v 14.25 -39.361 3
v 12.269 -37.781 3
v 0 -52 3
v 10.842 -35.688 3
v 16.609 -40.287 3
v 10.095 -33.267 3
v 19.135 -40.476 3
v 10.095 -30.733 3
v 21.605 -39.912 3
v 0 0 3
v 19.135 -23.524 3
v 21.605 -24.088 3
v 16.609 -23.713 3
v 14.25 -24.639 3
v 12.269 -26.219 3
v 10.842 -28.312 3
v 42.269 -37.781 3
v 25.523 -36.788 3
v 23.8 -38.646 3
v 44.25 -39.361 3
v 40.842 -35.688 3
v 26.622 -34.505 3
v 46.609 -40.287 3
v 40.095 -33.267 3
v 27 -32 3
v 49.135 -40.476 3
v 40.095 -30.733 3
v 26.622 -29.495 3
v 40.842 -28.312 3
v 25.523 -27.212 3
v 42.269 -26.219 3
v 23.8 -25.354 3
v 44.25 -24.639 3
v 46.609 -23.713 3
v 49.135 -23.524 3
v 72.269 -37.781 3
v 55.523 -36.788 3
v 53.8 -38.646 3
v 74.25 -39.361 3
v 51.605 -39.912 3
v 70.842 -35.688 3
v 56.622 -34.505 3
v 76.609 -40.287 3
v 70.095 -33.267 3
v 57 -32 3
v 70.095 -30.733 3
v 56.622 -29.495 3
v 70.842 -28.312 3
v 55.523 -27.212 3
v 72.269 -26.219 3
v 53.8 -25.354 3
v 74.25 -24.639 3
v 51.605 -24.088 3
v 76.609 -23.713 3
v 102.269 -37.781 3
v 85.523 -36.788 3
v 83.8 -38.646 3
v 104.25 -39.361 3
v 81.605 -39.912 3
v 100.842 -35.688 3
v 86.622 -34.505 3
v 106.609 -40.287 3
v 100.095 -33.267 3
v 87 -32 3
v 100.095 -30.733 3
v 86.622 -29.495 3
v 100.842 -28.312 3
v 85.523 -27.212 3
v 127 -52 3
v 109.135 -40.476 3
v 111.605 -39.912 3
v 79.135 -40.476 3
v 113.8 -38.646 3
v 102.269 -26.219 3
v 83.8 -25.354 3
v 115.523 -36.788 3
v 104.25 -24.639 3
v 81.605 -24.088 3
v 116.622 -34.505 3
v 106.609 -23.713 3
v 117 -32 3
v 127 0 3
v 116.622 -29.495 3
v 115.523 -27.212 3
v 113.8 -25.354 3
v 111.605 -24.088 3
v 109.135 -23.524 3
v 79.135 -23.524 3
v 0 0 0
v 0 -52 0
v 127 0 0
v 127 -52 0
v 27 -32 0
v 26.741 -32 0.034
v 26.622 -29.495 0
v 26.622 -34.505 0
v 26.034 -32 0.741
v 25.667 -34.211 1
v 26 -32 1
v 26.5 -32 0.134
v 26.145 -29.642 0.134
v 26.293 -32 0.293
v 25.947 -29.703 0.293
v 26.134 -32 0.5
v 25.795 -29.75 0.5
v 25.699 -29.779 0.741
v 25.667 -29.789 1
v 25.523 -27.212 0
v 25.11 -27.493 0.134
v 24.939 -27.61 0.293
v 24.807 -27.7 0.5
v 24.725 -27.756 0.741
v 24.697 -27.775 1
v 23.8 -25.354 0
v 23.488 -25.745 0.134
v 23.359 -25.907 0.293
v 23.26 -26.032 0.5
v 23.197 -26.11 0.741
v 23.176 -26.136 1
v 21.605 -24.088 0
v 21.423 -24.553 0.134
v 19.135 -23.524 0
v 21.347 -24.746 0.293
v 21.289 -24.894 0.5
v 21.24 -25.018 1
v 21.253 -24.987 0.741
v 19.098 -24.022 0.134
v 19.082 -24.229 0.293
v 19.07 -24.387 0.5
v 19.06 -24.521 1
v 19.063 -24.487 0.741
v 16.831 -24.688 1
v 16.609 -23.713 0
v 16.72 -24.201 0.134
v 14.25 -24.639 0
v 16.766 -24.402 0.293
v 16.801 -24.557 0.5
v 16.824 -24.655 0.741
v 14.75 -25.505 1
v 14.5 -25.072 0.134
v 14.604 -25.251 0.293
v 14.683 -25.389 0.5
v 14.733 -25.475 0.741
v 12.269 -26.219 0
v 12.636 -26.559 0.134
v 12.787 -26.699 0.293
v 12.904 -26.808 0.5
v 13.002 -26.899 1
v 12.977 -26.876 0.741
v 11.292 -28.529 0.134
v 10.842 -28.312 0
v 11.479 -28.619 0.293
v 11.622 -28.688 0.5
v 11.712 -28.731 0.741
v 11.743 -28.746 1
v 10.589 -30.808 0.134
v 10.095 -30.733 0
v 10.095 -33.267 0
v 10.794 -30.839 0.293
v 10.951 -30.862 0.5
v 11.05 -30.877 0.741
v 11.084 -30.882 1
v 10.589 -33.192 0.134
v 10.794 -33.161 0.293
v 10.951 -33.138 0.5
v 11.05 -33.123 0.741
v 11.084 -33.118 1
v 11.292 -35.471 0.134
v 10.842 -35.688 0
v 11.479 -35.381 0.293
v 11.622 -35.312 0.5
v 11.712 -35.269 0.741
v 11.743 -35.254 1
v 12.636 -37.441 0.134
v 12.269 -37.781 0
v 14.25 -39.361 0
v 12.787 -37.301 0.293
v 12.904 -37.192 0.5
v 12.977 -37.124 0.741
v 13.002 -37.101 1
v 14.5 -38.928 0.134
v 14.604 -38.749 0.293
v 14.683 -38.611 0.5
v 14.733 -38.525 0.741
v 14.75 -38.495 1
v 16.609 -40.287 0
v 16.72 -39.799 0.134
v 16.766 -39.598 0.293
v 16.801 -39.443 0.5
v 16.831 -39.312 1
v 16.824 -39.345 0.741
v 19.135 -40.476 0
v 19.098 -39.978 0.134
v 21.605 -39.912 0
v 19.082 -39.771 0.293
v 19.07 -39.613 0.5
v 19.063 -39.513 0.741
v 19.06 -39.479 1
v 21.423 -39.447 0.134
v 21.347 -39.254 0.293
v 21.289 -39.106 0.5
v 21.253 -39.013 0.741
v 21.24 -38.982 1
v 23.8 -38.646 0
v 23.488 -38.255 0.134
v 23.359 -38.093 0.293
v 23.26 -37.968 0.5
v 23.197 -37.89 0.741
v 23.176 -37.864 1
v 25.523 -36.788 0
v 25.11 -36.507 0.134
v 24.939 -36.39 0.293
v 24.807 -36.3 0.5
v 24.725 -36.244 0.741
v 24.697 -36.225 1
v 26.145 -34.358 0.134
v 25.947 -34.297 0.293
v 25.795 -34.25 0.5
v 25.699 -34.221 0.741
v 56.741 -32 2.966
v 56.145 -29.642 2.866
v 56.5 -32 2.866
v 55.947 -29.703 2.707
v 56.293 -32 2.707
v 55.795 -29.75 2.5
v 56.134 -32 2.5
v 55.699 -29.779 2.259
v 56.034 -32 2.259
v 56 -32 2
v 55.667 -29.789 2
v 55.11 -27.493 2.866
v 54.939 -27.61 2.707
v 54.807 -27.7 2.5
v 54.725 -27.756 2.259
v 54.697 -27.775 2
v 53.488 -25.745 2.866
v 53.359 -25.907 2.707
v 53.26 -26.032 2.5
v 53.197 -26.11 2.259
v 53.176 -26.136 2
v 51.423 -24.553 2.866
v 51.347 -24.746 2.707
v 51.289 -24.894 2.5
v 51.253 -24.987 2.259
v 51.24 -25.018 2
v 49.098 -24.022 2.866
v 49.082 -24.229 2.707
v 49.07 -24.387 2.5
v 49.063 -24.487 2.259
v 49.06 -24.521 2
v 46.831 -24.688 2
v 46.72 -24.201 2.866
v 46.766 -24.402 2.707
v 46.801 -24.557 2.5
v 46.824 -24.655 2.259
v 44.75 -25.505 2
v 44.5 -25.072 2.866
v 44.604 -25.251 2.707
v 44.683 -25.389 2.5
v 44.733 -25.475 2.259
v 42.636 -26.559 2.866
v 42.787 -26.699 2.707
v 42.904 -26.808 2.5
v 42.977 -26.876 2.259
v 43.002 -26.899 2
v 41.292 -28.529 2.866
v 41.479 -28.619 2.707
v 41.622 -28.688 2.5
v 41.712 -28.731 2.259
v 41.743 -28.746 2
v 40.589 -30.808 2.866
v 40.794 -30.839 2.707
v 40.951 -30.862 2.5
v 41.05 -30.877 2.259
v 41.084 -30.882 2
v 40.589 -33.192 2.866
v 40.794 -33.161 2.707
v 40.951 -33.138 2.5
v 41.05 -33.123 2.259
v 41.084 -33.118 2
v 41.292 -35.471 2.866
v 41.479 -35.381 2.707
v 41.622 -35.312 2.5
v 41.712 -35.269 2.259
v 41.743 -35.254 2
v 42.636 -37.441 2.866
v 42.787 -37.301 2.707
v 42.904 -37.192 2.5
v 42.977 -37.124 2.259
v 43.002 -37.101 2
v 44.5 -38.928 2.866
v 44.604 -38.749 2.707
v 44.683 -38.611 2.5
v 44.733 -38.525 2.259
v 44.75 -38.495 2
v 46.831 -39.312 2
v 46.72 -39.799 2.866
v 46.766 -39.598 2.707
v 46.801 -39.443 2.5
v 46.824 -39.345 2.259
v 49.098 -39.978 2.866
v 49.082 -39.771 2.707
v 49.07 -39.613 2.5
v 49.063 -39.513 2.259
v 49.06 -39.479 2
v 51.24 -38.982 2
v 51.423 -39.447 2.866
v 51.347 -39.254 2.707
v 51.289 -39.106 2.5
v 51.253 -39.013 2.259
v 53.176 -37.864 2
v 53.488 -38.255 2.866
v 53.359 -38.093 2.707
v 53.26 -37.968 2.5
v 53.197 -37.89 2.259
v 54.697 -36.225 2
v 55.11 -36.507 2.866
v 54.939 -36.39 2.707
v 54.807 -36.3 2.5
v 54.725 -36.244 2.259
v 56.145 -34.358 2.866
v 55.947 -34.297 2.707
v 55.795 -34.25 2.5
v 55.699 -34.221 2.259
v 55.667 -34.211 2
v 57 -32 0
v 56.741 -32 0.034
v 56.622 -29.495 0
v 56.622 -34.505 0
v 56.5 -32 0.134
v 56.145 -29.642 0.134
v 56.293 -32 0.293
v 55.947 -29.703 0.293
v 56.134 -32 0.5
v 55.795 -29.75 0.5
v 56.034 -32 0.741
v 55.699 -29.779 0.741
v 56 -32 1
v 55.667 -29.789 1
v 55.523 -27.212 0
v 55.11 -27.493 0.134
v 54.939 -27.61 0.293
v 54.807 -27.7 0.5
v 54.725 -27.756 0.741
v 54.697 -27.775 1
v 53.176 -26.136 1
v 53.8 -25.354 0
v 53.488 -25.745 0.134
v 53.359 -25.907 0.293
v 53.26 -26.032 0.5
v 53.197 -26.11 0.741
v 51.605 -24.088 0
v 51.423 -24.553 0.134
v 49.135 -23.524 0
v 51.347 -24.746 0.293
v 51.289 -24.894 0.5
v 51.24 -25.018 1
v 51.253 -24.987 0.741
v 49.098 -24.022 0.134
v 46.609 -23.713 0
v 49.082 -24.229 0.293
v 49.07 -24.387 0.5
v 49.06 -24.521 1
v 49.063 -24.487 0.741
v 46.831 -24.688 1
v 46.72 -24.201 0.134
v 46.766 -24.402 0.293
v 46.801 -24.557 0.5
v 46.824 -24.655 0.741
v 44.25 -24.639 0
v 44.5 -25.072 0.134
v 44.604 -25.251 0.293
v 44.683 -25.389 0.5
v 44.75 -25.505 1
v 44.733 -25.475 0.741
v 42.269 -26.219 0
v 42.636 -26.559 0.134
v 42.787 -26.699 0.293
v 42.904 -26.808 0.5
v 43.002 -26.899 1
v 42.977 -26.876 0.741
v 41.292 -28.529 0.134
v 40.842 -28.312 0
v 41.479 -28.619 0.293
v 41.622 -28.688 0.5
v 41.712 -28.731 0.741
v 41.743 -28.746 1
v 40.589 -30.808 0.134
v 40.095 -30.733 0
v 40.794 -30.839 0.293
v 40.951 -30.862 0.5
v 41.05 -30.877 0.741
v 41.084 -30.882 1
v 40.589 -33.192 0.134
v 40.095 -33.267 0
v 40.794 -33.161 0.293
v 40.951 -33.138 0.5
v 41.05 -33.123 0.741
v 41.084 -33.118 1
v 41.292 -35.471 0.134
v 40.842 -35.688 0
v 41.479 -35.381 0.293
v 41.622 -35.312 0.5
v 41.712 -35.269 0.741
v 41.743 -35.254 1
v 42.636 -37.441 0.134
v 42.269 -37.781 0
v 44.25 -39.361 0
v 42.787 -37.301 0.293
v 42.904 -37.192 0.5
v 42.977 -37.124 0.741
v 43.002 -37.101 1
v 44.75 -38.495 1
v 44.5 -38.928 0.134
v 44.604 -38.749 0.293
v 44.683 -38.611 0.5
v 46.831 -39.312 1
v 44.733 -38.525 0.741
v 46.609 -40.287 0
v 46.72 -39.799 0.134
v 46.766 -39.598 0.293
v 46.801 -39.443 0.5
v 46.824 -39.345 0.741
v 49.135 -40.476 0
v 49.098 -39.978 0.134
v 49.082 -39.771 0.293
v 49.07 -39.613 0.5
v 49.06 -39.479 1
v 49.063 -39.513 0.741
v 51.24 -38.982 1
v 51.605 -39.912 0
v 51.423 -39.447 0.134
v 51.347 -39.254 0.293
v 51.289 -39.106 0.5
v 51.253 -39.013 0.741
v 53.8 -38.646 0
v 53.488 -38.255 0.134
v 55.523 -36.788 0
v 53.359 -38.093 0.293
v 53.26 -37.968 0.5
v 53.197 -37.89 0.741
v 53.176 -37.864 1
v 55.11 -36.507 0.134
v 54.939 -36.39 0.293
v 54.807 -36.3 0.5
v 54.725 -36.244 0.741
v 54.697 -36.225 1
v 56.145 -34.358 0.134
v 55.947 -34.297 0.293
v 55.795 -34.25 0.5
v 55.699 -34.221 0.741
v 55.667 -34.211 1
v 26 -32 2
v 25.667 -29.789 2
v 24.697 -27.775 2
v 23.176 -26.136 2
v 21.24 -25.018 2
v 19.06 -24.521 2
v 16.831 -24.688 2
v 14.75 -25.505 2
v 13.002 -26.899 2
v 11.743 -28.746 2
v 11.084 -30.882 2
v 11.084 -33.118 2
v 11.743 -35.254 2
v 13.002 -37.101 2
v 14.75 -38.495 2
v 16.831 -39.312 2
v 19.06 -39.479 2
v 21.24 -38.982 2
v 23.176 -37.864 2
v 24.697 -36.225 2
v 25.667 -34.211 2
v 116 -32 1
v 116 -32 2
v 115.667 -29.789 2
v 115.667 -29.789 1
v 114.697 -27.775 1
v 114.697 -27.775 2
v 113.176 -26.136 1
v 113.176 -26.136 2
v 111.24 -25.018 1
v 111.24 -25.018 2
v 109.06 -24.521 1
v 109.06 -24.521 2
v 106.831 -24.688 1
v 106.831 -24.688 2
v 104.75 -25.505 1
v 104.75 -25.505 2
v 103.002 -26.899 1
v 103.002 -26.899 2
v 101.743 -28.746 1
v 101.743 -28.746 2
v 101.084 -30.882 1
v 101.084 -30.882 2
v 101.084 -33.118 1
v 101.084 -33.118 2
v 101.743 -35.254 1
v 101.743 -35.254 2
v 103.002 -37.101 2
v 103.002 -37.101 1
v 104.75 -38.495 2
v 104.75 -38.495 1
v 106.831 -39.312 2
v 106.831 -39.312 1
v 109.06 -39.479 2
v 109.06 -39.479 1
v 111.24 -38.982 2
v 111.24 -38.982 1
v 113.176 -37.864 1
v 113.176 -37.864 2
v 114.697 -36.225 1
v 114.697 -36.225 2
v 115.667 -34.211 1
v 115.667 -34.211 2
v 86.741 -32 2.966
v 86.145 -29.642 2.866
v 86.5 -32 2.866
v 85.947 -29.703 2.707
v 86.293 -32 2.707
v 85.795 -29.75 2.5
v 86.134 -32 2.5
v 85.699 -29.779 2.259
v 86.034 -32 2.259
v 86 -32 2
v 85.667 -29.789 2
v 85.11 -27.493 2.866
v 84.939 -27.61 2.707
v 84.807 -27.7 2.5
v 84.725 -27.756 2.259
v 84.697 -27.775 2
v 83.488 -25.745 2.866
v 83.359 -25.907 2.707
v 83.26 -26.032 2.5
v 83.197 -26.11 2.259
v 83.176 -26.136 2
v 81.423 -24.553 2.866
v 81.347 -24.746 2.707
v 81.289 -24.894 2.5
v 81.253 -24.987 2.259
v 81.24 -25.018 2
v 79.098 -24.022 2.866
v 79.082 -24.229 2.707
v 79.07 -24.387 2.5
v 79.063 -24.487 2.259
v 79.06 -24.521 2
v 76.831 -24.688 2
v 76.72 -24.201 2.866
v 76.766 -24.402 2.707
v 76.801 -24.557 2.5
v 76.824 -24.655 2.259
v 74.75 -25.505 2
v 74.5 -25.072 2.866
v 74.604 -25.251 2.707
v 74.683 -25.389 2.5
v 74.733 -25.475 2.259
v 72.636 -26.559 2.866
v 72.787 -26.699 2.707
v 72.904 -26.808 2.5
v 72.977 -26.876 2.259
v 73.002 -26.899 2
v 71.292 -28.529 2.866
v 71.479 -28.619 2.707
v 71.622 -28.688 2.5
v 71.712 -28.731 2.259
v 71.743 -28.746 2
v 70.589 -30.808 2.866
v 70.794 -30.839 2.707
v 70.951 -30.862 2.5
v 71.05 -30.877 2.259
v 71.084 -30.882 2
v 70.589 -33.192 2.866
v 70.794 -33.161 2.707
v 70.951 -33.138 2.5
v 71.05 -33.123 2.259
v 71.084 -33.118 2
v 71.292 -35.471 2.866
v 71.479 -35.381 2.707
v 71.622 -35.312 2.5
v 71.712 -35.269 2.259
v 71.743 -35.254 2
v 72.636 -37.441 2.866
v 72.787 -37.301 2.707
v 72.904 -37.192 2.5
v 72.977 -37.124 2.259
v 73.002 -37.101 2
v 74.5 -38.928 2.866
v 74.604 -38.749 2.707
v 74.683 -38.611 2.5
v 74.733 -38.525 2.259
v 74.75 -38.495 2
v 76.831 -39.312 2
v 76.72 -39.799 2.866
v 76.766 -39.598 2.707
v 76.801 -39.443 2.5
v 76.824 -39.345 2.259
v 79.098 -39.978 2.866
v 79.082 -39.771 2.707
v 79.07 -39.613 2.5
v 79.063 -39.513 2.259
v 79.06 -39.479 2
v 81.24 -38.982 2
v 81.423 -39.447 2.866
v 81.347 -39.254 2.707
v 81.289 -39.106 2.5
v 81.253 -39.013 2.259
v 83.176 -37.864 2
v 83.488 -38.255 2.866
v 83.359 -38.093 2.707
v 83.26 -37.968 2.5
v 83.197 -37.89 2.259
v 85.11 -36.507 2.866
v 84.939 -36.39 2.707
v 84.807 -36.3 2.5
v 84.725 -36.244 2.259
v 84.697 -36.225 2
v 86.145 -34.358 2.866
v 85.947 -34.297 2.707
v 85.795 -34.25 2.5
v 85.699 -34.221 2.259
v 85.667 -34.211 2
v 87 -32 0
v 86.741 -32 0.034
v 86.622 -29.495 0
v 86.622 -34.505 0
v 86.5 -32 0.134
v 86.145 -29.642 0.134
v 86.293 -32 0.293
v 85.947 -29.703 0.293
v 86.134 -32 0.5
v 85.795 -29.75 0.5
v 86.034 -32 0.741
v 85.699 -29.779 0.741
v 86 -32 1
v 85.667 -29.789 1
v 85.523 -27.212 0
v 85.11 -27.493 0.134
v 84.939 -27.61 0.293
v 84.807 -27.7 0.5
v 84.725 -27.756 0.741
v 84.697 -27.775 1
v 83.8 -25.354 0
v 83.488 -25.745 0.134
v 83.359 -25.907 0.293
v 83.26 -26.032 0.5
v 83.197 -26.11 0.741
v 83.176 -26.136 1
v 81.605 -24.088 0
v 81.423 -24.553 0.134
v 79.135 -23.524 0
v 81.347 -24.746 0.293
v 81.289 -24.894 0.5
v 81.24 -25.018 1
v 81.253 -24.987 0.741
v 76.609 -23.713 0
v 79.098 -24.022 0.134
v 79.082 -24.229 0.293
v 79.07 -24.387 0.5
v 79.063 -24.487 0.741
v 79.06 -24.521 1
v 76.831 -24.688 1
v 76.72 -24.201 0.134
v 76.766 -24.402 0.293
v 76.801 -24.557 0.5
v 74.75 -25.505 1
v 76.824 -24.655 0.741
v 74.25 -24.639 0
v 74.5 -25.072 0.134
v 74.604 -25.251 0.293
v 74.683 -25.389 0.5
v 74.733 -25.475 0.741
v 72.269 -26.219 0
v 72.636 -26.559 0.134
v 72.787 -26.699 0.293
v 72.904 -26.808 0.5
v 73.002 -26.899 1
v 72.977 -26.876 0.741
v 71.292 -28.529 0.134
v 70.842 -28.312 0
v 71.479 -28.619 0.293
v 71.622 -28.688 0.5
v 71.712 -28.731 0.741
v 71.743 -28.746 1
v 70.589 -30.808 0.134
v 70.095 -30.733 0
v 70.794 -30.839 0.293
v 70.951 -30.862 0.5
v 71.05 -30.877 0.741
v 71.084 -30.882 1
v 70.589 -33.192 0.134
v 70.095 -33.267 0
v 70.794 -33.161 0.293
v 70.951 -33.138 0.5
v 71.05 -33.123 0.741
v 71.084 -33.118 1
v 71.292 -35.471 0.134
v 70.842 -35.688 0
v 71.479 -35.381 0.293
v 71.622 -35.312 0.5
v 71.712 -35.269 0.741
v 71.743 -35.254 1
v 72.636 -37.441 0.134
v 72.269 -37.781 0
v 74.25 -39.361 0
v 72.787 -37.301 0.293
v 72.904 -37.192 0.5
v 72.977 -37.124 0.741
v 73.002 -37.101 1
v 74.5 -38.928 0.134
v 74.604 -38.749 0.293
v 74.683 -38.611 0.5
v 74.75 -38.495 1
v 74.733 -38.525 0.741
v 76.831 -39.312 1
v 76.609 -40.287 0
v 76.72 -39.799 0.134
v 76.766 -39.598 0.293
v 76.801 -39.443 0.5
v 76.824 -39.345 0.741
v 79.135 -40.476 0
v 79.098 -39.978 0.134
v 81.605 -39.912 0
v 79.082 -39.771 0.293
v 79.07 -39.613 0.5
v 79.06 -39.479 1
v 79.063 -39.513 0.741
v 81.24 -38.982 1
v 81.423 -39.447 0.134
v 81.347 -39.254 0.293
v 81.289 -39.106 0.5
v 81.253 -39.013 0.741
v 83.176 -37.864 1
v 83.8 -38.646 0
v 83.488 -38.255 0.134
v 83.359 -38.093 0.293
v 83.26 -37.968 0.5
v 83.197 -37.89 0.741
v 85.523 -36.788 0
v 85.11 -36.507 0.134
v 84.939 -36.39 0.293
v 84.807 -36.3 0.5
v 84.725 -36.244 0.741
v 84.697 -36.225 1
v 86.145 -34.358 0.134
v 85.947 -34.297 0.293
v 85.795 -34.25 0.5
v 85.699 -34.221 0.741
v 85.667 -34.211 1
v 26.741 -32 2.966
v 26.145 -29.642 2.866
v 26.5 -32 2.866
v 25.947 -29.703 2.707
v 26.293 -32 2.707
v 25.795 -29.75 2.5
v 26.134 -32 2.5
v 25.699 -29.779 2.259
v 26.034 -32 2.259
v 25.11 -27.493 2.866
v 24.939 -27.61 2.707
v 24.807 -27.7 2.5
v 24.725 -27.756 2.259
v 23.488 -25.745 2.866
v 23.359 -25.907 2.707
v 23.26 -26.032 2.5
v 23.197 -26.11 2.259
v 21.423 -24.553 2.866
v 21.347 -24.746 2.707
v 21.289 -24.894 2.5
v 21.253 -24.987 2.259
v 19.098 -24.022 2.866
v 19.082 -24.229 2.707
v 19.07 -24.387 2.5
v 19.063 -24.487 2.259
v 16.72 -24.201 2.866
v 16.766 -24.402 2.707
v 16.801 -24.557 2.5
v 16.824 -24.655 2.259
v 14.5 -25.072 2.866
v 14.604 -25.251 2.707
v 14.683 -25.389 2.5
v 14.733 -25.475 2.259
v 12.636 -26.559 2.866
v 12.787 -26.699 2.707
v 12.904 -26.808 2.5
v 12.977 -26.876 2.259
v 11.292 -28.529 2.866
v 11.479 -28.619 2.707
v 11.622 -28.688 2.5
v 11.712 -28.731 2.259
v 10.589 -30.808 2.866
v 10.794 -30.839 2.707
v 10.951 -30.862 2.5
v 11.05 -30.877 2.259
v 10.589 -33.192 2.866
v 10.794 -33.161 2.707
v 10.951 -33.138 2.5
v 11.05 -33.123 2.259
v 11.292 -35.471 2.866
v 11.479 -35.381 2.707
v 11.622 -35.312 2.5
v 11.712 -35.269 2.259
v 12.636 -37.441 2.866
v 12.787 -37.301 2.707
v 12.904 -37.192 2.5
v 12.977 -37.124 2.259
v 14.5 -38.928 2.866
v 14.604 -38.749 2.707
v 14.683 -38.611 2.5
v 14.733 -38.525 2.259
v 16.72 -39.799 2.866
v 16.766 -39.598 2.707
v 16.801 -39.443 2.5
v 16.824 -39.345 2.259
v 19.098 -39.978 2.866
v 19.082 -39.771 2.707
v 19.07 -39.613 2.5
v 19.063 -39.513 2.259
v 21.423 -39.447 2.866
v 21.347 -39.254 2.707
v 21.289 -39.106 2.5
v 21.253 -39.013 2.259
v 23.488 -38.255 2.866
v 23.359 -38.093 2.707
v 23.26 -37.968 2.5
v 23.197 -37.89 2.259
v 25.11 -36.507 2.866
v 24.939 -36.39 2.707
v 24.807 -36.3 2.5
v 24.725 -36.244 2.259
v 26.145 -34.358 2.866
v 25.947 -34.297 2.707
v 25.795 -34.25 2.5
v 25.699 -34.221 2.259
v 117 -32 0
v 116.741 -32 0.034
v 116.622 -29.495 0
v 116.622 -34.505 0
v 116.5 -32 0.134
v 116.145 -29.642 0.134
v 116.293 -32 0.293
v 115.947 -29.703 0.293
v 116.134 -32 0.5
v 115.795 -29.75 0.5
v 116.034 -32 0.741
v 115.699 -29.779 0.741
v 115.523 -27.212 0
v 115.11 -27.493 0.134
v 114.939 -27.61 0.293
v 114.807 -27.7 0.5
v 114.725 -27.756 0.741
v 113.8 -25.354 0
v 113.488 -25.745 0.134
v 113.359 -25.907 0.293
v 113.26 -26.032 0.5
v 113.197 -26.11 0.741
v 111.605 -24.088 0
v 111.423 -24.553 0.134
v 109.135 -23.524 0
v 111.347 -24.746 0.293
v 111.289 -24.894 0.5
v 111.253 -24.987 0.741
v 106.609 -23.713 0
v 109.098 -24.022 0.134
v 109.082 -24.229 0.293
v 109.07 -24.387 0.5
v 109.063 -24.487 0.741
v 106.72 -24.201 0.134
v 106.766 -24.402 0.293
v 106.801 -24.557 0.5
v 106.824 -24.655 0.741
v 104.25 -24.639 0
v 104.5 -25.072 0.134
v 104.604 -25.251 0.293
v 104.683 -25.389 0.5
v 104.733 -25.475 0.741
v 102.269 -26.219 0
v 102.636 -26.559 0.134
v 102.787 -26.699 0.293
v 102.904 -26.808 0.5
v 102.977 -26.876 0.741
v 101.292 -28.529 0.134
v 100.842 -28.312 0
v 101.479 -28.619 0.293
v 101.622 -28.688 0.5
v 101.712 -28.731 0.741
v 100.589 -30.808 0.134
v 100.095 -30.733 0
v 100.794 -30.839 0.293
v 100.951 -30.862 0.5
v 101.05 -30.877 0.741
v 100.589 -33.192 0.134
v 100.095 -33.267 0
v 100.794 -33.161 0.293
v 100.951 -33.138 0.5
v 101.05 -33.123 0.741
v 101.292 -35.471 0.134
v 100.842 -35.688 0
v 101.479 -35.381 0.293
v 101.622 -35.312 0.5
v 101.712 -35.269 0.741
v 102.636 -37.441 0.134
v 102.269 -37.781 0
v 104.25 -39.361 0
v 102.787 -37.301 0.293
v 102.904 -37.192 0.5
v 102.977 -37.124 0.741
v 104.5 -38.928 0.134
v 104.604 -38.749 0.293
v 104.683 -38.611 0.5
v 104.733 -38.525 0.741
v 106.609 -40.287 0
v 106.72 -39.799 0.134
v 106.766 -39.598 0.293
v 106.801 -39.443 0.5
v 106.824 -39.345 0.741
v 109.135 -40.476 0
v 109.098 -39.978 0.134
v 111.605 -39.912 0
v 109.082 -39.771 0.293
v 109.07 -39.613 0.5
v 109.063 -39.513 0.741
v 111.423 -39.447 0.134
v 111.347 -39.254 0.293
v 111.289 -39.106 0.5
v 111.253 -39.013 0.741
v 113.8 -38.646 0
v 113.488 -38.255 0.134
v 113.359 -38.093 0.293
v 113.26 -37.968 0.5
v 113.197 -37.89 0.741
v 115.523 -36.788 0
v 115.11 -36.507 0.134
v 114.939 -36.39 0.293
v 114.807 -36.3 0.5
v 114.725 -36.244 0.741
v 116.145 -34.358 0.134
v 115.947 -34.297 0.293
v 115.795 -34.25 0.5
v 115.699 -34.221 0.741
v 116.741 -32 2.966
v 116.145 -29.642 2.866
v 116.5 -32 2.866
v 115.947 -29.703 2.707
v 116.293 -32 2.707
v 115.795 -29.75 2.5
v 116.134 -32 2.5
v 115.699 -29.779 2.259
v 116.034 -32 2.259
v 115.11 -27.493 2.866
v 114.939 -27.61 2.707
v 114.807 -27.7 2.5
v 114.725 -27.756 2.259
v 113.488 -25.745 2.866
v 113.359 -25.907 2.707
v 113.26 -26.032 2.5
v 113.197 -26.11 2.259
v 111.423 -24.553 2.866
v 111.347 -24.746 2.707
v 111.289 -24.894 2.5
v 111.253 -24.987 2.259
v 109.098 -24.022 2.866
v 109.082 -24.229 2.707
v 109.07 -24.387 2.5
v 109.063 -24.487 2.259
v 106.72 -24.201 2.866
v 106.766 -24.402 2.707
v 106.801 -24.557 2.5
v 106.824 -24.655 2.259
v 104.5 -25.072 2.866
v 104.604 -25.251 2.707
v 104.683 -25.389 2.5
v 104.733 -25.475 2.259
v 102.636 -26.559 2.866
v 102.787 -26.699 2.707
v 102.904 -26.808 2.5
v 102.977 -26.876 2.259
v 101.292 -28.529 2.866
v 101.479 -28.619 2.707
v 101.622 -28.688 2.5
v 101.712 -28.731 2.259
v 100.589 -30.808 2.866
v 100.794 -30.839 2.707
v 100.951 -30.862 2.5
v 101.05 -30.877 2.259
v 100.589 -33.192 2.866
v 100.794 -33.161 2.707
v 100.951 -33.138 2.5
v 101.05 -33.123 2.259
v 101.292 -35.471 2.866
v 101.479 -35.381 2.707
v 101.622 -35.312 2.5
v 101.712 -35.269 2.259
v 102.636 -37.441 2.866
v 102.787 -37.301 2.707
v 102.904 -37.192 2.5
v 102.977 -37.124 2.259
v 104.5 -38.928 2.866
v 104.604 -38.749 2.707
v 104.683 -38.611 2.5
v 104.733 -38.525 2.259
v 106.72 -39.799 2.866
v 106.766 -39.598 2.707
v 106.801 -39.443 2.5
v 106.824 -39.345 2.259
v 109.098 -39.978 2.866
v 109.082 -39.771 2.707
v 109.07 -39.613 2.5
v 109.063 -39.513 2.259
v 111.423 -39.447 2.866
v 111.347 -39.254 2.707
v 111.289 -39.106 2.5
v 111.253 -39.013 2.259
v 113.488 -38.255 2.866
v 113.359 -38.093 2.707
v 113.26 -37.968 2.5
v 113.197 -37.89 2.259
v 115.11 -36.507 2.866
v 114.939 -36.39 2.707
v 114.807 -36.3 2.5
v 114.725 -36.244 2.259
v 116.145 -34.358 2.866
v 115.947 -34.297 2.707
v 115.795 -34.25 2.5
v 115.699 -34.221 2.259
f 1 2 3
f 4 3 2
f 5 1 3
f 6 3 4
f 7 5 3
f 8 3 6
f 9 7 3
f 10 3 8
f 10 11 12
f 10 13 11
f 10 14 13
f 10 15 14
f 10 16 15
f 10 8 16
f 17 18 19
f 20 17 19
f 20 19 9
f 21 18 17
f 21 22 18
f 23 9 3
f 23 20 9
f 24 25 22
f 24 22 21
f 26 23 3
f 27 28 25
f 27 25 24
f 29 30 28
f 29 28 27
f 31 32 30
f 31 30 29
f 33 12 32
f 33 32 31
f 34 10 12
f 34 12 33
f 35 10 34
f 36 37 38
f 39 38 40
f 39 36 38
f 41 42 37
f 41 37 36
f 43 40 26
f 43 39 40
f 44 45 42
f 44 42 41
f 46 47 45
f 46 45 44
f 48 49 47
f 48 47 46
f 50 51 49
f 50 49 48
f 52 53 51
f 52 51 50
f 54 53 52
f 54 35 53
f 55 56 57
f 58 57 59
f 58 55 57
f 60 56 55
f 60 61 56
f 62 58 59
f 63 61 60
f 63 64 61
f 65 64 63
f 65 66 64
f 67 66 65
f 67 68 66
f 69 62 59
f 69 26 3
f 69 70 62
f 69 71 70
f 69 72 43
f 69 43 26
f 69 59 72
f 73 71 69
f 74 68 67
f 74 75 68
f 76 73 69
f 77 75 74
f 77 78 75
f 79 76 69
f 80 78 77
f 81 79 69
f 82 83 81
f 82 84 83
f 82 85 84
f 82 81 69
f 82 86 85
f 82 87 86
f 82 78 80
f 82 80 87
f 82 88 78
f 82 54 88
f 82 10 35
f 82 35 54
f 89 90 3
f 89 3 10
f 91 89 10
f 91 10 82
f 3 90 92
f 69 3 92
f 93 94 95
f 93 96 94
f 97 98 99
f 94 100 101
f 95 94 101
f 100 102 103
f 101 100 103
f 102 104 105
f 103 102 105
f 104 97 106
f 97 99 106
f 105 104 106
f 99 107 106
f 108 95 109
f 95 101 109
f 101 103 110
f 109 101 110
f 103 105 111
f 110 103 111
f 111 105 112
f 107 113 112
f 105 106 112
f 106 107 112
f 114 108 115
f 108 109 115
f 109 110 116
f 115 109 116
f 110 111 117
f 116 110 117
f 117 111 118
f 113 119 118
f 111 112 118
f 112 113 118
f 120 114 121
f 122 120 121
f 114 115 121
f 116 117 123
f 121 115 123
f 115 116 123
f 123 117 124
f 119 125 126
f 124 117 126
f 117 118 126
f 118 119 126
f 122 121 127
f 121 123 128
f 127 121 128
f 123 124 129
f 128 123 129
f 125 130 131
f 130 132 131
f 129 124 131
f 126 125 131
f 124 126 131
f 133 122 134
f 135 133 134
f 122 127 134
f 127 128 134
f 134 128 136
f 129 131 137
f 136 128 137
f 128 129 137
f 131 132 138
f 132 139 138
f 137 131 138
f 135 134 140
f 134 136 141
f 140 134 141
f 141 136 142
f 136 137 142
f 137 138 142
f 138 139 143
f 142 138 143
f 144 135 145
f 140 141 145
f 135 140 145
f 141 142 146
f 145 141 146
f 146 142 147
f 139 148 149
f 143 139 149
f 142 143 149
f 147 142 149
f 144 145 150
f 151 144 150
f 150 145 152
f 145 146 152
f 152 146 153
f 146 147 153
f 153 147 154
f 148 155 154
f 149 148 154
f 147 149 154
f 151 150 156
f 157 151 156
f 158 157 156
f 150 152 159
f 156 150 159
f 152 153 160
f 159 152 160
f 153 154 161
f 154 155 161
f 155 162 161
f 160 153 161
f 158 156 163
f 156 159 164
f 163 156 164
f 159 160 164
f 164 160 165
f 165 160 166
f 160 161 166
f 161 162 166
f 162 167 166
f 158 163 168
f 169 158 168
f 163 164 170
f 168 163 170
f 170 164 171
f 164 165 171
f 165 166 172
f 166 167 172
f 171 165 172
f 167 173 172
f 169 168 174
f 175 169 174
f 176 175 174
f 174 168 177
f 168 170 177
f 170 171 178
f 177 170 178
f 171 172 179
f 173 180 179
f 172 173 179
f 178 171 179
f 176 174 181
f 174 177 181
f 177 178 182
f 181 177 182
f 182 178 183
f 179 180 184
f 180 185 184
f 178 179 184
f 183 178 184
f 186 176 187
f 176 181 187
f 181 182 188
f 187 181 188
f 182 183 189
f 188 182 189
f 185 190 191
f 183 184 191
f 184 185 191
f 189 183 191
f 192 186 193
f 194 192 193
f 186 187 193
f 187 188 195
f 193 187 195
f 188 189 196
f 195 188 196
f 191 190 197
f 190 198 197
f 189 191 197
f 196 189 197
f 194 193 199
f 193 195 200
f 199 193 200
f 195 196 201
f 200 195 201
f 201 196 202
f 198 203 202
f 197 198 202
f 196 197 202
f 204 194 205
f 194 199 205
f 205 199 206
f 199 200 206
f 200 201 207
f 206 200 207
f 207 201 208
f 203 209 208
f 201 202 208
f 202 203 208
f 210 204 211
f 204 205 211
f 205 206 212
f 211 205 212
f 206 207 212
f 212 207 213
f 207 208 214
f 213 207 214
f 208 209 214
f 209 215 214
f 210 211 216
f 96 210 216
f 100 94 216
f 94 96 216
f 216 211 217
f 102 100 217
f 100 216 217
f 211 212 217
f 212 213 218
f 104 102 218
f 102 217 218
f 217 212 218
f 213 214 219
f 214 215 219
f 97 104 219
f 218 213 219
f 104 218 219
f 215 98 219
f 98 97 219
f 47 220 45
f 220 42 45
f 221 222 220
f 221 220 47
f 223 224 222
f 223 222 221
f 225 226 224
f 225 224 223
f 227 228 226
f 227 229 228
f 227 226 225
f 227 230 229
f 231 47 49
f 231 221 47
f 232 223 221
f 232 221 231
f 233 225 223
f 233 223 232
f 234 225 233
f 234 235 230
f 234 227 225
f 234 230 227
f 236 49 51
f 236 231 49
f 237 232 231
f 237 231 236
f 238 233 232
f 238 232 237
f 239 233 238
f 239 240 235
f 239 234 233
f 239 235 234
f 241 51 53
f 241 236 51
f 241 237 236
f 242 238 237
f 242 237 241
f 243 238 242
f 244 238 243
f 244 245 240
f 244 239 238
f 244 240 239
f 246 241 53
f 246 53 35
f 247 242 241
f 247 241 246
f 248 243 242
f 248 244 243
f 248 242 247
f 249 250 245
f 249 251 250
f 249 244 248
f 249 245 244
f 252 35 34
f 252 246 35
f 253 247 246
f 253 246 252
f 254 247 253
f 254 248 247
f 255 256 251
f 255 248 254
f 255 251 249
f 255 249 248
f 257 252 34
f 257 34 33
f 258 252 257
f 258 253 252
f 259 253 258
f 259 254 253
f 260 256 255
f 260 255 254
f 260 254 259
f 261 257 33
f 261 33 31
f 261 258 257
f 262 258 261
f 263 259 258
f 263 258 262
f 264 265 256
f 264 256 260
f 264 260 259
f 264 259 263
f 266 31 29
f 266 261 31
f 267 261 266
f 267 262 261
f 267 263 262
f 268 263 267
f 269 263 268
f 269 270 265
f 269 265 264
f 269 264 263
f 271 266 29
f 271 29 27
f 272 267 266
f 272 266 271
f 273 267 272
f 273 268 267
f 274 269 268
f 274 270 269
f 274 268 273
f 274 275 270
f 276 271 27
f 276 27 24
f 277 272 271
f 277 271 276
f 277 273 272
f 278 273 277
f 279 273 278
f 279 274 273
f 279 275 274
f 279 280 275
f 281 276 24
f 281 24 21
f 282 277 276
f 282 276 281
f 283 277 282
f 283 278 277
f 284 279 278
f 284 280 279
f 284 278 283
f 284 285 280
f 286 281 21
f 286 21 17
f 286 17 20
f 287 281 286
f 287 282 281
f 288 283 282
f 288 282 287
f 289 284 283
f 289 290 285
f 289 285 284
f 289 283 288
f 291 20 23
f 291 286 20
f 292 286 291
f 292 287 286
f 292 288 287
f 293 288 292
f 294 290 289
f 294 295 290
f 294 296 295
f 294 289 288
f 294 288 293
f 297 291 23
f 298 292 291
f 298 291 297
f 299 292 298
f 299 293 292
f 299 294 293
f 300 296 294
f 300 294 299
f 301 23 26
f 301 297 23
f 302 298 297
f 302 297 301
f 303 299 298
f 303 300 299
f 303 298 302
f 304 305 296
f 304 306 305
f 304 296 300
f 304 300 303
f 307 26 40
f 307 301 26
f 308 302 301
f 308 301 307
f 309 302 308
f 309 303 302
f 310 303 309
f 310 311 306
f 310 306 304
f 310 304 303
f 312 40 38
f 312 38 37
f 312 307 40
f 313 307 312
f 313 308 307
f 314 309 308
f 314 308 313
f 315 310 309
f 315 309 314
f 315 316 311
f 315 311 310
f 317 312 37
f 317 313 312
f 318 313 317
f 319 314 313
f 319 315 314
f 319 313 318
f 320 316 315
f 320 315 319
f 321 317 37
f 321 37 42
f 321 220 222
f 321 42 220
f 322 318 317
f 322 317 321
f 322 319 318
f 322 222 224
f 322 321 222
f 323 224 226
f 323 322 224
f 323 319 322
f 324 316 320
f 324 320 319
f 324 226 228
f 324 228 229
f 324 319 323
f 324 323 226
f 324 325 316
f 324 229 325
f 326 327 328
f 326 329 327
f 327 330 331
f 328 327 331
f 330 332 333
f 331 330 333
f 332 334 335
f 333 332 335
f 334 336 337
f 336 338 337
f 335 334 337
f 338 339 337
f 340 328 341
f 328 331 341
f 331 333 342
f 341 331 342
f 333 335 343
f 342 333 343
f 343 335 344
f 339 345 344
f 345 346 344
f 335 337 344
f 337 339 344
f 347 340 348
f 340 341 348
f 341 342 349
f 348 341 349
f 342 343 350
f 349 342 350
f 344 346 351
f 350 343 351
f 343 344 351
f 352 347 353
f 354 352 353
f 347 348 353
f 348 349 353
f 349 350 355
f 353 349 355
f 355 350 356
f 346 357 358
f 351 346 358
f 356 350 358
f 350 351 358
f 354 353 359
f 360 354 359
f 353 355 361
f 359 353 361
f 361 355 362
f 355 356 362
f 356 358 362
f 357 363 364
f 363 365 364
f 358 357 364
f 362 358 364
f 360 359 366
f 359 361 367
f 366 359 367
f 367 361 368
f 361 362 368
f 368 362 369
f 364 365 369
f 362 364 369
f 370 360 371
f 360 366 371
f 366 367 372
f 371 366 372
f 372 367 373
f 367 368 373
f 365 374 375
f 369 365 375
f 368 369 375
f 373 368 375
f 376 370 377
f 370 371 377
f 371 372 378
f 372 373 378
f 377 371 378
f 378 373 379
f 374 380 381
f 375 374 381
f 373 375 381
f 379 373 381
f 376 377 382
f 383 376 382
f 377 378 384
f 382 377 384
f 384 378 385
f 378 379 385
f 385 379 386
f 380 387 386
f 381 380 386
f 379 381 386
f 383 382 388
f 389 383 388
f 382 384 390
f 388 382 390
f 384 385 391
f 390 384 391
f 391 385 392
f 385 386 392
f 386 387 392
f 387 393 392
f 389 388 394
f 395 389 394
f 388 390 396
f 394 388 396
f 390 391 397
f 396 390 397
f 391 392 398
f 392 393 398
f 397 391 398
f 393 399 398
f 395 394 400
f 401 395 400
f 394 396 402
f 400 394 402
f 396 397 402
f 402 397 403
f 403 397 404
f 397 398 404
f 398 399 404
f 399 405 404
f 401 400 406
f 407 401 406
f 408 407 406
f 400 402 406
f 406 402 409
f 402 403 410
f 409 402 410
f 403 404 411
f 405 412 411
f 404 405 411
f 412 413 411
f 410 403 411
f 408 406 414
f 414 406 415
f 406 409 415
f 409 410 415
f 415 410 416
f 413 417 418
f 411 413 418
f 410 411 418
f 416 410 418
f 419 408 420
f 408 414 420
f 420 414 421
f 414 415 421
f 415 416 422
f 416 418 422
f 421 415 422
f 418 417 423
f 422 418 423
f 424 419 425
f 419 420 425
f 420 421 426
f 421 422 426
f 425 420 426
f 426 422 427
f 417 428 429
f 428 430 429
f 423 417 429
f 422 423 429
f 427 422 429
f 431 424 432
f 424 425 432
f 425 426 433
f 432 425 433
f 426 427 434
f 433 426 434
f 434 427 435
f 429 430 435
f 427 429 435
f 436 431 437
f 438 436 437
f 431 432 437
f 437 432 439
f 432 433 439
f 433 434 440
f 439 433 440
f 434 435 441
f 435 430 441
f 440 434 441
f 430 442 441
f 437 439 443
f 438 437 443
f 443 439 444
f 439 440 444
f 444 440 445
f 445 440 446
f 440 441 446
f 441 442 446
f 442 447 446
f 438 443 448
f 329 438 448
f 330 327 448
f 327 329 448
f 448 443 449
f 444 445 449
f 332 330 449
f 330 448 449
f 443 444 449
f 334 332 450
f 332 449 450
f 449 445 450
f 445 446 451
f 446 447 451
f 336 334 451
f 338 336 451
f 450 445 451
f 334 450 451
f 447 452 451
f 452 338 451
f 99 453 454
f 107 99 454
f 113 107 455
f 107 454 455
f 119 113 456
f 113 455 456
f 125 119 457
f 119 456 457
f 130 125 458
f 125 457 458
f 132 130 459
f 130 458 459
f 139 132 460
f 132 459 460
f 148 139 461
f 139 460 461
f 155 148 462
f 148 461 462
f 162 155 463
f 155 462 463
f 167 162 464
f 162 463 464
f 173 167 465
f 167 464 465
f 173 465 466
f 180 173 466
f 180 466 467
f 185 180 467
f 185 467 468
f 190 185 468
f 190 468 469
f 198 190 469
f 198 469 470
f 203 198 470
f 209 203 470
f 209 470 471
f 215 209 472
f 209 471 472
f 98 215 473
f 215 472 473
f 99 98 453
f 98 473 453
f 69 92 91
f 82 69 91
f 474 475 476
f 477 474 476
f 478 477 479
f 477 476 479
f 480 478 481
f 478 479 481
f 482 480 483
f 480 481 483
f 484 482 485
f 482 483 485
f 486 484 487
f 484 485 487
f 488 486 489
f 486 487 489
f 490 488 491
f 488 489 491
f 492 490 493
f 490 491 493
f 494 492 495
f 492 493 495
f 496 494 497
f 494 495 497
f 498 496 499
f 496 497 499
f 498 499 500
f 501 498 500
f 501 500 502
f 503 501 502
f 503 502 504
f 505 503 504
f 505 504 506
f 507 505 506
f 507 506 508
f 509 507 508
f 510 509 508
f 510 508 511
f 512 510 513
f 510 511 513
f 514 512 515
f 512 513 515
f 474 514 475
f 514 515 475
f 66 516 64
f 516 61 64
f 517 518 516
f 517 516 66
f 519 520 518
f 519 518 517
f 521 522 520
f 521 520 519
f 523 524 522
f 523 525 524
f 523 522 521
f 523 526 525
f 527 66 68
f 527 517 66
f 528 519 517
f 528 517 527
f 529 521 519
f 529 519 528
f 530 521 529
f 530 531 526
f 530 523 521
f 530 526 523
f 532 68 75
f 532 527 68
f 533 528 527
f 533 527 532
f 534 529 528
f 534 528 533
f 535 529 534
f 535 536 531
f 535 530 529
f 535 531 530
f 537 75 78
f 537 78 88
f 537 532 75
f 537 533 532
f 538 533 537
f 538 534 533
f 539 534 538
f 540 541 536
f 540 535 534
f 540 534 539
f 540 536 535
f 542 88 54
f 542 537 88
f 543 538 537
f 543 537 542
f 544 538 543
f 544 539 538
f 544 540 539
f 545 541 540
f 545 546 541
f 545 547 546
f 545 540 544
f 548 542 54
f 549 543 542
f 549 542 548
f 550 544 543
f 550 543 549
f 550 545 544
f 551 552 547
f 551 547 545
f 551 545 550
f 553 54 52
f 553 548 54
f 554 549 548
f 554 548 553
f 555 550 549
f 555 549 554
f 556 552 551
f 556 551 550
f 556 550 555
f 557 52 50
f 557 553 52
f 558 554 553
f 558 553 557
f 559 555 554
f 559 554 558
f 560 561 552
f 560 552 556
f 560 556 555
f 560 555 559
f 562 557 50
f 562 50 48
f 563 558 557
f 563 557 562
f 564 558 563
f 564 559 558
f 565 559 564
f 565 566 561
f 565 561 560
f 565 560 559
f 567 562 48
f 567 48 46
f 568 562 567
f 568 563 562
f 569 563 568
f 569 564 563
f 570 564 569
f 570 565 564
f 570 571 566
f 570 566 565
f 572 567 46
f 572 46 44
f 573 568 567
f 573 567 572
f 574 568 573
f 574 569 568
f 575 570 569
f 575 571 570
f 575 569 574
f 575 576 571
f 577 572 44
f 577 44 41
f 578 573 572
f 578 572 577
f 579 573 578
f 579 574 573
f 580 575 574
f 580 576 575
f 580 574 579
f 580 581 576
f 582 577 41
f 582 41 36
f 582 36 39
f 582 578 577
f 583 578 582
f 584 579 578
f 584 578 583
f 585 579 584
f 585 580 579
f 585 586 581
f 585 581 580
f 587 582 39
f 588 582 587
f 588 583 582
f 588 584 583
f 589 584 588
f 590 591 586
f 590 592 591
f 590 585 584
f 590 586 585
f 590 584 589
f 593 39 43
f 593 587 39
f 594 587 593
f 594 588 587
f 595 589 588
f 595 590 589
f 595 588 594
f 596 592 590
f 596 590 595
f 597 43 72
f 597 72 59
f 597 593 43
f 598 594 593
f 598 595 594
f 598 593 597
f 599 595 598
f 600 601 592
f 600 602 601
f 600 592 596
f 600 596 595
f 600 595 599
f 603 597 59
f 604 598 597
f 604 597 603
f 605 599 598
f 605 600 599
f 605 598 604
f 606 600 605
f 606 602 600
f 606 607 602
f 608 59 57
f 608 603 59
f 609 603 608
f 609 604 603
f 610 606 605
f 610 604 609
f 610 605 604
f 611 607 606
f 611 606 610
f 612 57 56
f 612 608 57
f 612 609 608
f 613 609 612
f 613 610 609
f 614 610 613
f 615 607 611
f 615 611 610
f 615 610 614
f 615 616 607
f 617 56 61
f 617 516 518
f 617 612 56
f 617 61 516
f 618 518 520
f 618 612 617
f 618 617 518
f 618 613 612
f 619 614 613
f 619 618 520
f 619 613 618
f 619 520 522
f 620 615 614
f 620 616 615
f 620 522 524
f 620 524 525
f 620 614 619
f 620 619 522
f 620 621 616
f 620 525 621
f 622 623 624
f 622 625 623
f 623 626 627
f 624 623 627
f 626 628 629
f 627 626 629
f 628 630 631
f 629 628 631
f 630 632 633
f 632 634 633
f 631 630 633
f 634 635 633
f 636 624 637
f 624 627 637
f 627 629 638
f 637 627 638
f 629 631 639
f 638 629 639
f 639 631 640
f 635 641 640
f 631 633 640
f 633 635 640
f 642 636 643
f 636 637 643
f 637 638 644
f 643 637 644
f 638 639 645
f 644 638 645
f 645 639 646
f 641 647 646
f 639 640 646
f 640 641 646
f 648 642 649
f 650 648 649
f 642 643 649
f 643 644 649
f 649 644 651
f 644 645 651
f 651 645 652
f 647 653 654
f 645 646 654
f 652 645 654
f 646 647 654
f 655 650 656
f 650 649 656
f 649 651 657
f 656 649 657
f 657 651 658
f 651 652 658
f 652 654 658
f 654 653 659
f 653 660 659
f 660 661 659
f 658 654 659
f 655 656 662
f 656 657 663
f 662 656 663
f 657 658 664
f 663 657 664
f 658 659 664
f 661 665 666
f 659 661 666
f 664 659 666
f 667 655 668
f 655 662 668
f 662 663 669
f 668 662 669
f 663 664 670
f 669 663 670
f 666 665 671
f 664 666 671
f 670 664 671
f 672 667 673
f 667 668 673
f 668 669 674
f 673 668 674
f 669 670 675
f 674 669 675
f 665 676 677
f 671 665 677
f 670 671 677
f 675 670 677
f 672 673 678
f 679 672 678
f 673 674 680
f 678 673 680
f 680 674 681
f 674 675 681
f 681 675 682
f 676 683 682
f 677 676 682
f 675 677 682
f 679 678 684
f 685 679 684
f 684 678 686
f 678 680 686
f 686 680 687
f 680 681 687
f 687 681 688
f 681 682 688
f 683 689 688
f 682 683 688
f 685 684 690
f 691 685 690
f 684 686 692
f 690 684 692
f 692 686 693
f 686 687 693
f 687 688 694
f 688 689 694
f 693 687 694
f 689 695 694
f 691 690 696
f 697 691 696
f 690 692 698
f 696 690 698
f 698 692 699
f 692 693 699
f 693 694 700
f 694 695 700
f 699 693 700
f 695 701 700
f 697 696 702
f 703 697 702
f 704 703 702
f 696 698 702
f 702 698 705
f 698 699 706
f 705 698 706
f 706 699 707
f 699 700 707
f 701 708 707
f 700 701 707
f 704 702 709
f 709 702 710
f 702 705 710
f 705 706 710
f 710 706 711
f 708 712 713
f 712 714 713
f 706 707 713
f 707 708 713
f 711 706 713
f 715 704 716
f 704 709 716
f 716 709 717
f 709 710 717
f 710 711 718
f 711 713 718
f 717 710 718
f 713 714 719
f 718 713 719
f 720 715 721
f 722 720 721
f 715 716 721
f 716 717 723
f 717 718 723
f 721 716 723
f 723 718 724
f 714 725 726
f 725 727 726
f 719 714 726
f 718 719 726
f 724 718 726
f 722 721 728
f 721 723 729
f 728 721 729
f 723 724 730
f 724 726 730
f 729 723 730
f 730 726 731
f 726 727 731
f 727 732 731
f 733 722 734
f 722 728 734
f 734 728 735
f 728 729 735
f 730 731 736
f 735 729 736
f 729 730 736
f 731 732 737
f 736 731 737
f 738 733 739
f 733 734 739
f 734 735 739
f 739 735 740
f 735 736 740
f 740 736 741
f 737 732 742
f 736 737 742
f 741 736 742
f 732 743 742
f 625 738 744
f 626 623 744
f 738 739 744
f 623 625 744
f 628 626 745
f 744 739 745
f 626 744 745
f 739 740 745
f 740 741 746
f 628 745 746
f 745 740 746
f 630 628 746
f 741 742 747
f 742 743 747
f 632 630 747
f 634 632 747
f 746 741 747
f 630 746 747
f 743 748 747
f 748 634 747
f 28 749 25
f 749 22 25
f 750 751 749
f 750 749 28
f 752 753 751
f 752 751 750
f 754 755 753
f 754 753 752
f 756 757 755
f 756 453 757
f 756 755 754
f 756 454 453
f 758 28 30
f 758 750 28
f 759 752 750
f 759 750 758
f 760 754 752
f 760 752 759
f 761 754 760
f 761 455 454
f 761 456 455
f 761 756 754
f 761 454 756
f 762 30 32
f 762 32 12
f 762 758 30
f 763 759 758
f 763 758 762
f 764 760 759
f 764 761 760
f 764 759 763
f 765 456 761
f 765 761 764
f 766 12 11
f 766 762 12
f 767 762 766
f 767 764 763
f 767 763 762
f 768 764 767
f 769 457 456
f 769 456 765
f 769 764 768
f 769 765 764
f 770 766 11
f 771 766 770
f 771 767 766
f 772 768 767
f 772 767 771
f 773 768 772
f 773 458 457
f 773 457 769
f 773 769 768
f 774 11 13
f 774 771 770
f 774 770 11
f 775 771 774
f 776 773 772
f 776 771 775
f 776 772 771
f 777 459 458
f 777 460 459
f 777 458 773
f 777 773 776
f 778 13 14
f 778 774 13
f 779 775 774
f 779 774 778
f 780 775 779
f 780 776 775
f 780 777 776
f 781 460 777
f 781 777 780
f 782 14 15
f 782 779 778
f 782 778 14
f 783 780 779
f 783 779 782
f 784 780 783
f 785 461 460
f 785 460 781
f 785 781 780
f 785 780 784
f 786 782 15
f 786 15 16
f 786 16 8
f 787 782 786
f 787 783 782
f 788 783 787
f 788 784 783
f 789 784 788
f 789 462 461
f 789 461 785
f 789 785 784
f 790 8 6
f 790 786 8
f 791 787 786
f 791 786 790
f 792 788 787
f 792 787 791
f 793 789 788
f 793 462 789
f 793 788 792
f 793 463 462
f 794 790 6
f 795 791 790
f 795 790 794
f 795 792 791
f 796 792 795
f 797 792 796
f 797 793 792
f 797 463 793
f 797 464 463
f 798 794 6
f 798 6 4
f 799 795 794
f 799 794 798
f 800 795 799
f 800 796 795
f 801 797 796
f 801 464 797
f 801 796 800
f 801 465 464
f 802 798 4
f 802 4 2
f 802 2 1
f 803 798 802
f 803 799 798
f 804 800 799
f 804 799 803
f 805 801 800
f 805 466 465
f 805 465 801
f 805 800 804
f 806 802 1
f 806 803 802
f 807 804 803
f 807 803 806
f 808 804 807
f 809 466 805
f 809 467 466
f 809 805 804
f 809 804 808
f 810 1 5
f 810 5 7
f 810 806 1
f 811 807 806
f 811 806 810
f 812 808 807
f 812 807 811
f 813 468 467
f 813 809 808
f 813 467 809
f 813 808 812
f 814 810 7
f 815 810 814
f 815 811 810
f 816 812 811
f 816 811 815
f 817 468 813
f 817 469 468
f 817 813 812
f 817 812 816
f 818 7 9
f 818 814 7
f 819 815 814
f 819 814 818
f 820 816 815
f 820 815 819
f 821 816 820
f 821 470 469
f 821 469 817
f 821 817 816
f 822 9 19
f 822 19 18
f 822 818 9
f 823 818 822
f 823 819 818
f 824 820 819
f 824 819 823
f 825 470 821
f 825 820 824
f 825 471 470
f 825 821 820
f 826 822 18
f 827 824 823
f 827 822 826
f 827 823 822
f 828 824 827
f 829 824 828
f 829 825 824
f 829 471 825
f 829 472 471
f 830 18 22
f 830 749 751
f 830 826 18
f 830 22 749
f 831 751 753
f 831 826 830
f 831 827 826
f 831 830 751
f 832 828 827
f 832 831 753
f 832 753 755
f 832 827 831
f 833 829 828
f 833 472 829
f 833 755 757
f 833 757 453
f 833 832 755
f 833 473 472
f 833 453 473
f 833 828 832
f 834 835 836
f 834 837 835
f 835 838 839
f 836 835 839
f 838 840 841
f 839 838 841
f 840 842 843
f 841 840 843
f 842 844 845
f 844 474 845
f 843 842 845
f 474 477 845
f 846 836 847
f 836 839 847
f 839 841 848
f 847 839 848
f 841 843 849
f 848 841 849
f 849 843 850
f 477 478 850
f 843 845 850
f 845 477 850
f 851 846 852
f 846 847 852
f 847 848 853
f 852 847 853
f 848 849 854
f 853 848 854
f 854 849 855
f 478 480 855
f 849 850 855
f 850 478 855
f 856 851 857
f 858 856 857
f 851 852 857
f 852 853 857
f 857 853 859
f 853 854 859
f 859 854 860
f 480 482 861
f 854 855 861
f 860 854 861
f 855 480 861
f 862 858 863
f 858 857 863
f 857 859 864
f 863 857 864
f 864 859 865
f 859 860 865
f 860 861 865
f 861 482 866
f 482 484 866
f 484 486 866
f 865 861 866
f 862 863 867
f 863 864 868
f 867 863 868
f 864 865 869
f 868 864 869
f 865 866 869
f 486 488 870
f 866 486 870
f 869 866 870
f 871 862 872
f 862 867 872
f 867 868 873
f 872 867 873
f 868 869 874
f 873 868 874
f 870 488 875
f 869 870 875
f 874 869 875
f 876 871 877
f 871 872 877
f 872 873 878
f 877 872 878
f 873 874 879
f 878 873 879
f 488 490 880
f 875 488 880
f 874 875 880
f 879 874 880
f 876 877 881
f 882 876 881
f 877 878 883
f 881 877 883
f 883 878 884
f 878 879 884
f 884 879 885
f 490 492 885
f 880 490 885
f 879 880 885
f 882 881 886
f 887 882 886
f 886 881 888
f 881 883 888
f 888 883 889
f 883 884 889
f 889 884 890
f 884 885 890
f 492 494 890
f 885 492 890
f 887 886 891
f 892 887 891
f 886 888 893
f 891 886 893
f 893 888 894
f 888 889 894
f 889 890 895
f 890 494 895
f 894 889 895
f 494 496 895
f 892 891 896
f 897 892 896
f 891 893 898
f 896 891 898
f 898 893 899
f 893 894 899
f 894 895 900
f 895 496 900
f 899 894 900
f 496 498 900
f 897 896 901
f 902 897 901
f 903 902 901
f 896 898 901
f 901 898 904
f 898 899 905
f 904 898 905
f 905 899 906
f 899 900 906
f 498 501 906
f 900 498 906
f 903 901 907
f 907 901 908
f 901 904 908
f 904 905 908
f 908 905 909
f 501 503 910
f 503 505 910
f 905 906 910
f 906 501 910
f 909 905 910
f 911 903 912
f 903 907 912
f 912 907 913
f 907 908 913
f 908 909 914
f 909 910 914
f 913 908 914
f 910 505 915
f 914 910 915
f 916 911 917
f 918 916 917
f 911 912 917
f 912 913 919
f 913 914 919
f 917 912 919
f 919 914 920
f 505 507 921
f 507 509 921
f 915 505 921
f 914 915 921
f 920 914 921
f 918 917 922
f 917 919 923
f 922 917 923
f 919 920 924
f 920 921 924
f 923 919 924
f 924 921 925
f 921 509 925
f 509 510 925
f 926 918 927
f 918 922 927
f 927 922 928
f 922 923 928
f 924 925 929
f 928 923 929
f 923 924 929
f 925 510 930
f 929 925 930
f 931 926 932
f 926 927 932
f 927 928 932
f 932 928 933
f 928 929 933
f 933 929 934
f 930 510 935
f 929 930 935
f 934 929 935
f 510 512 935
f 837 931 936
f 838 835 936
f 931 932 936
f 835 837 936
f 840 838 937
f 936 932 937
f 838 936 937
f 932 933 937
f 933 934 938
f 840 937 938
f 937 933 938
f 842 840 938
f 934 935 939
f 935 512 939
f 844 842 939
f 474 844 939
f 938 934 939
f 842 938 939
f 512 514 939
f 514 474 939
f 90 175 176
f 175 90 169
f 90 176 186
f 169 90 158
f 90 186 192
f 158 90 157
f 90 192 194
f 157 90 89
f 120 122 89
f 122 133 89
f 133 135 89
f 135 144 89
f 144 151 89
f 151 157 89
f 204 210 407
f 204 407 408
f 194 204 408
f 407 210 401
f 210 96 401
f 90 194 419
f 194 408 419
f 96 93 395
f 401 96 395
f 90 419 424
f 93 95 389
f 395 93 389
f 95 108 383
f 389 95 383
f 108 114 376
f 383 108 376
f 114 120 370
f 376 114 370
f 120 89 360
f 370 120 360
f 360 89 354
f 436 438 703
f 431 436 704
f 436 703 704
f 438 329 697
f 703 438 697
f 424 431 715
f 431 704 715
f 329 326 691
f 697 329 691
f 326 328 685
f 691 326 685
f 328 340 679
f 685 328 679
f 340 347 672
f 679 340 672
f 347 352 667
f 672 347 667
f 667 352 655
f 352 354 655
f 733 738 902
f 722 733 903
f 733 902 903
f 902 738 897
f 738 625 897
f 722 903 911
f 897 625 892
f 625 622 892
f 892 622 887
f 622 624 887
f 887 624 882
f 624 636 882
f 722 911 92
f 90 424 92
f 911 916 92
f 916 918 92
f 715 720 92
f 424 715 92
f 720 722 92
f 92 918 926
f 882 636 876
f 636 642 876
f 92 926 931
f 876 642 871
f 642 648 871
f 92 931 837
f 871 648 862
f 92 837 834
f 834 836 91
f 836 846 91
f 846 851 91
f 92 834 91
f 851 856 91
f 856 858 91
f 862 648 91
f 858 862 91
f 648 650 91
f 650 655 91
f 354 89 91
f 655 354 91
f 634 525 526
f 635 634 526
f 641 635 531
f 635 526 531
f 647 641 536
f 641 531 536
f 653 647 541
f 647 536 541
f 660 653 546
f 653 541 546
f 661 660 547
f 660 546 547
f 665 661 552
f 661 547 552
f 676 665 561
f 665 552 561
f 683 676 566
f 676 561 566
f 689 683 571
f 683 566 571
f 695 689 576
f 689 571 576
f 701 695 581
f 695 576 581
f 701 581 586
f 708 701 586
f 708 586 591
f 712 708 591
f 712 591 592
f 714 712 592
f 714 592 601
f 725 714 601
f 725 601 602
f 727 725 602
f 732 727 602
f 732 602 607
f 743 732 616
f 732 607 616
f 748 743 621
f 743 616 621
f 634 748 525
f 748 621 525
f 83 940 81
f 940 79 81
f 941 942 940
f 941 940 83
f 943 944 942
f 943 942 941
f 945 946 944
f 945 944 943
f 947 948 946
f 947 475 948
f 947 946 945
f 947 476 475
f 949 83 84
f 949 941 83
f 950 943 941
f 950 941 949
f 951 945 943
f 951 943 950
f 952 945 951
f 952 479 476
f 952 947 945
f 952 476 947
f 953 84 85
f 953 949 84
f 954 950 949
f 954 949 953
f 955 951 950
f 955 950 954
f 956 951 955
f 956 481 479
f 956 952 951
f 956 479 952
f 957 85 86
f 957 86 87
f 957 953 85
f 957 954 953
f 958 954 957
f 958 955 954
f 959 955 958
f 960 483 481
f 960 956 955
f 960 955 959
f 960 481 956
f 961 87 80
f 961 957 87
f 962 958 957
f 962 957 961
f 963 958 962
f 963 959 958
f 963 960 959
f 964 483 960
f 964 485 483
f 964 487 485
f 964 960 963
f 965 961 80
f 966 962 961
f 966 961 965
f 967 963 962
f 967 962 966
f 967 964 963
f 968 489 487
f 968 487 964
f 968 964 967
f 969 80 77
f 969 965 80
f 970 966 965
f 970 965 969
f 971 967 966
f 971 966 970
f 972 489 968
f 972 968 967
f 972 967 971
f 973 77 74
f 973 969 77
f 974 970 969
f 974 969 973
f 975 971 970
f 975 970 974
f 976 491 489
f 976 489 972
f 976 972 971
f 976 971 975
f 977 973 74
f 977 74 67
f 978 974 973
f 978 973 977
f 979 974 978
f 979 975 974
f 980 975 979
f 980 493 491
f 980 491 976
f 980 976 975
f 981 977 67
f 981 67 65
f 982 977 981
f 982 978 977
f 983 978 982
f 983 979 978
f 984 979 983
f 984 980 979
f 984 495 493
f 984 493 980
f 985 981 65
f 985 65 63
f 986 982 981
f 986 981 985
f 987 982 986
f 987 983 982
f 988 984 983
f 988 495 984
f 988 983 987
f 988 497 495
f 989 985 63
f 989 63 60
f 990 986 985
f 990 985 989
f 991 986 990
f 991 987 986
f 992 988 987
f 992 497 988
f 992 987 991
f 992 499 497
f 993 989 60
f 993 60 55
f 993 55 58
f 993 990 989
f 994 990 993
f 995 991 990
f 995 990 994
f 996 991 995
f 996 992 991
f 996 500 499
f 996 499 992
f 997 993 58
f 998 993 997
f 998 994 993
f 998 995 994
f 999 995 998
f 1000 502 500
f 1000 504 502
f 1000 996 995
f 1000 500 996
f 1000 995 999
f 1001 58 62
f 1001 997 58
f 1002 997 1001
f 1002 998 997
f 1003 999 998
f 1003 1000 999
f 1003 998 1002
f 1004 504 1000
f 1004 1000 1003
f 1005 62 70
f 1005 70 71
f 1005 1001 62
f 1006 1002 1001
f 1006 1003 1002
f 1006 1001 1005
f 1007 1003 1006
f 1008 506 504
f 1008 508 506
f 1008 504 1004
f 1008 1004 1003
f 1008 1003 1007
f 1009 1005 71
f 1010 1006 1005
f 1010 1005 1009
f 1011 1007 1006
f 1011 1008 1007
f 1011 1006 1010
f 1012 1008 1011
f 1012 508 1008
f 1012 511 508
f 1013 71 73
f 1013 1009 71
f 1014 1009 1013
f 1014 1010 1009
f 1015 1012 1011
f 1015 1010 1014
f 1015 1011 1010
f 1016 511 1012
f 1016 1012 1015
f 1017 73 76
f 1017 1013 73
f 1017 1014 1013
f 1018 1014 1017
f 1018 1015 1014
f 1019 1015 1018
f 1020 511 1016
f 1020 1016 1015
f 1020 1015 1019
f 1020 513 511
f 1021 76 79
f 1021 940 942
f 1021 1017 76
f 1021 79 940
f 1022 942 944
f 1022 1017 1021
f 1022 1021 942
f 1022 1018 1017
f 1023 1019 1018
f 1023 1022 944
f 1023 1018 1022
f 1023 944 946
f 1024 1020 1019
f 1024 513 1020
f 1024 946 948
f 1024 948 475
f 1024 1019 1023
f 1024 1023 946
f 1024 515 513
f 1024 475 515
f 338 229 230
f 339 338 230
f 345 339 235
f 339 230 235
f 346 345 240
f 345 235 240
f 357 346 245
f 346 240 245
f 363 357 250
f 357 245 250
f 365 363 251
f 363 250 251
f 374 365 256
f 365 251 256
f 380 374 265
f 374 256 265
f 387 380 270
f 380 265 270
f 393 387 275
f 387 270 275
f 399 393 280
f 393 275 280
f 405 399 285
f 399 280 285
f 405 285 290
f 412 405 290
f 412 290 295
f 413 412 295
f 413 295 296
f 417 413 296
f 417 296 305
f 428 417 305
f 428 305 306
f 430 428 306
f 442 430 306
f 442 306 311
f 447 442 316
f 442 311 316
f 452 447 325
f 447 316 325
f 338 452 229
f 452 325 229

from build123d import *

# Parameters (mm, degrees)
SKETCH_1_W          = 127
SKETCH_1_H          = 52
EXTRUDE_1_DEPTH     = 3
SKETCH_2_R          = 7.5
CUT_EXTRUDE_1_DEPTH = 3
FILLET_1_R          = 1


with BuildPart() as part:
    # 草图1 → 凸台-拉伸1 (new body)
    with BuildSketch(Plane.XY):
        with Locations((63.5, -26)):
            Rectangle(SKETCH_1_W, SKETCH_1_H)
    extrude(amount=EXTRUDE_1_DEPTH)

    # 草图2 → 切除-拉伸1 (cut)
    with BuildSketch(Plane.XY.offset(3)):
        with Locations((78.5, -32)):
            Circle(SKETCH_2_R)
        with Locations((108.5, -32)):
            Circle(SKETCH_2_R)
        with Locations((48.5, -32)):
            Circle(SKETCH_2_R)
        with Locations((18.5, -32)):
            Circle(SKETCH_2_R)
    extrude(amount=-CUT_EXTRUDE_1_DEPTH, mode=Mode.SUBTRACT)

    # 圆角1
    fillet_1_edges = [part.edges().sort_by_distance(p)[0] for p in [
        (11, -32, 0),
        (11, -32, 3),
        (41, -32, 0),
        (41, -32, 3),
        (101, -32, 0),
        (101, -32, 3),
        (71, -32, 0),
        (71, -32, 3),
    ]]
    fillet(fillet_1_edges, radius=FILLET_1_R)


solid = part.part
